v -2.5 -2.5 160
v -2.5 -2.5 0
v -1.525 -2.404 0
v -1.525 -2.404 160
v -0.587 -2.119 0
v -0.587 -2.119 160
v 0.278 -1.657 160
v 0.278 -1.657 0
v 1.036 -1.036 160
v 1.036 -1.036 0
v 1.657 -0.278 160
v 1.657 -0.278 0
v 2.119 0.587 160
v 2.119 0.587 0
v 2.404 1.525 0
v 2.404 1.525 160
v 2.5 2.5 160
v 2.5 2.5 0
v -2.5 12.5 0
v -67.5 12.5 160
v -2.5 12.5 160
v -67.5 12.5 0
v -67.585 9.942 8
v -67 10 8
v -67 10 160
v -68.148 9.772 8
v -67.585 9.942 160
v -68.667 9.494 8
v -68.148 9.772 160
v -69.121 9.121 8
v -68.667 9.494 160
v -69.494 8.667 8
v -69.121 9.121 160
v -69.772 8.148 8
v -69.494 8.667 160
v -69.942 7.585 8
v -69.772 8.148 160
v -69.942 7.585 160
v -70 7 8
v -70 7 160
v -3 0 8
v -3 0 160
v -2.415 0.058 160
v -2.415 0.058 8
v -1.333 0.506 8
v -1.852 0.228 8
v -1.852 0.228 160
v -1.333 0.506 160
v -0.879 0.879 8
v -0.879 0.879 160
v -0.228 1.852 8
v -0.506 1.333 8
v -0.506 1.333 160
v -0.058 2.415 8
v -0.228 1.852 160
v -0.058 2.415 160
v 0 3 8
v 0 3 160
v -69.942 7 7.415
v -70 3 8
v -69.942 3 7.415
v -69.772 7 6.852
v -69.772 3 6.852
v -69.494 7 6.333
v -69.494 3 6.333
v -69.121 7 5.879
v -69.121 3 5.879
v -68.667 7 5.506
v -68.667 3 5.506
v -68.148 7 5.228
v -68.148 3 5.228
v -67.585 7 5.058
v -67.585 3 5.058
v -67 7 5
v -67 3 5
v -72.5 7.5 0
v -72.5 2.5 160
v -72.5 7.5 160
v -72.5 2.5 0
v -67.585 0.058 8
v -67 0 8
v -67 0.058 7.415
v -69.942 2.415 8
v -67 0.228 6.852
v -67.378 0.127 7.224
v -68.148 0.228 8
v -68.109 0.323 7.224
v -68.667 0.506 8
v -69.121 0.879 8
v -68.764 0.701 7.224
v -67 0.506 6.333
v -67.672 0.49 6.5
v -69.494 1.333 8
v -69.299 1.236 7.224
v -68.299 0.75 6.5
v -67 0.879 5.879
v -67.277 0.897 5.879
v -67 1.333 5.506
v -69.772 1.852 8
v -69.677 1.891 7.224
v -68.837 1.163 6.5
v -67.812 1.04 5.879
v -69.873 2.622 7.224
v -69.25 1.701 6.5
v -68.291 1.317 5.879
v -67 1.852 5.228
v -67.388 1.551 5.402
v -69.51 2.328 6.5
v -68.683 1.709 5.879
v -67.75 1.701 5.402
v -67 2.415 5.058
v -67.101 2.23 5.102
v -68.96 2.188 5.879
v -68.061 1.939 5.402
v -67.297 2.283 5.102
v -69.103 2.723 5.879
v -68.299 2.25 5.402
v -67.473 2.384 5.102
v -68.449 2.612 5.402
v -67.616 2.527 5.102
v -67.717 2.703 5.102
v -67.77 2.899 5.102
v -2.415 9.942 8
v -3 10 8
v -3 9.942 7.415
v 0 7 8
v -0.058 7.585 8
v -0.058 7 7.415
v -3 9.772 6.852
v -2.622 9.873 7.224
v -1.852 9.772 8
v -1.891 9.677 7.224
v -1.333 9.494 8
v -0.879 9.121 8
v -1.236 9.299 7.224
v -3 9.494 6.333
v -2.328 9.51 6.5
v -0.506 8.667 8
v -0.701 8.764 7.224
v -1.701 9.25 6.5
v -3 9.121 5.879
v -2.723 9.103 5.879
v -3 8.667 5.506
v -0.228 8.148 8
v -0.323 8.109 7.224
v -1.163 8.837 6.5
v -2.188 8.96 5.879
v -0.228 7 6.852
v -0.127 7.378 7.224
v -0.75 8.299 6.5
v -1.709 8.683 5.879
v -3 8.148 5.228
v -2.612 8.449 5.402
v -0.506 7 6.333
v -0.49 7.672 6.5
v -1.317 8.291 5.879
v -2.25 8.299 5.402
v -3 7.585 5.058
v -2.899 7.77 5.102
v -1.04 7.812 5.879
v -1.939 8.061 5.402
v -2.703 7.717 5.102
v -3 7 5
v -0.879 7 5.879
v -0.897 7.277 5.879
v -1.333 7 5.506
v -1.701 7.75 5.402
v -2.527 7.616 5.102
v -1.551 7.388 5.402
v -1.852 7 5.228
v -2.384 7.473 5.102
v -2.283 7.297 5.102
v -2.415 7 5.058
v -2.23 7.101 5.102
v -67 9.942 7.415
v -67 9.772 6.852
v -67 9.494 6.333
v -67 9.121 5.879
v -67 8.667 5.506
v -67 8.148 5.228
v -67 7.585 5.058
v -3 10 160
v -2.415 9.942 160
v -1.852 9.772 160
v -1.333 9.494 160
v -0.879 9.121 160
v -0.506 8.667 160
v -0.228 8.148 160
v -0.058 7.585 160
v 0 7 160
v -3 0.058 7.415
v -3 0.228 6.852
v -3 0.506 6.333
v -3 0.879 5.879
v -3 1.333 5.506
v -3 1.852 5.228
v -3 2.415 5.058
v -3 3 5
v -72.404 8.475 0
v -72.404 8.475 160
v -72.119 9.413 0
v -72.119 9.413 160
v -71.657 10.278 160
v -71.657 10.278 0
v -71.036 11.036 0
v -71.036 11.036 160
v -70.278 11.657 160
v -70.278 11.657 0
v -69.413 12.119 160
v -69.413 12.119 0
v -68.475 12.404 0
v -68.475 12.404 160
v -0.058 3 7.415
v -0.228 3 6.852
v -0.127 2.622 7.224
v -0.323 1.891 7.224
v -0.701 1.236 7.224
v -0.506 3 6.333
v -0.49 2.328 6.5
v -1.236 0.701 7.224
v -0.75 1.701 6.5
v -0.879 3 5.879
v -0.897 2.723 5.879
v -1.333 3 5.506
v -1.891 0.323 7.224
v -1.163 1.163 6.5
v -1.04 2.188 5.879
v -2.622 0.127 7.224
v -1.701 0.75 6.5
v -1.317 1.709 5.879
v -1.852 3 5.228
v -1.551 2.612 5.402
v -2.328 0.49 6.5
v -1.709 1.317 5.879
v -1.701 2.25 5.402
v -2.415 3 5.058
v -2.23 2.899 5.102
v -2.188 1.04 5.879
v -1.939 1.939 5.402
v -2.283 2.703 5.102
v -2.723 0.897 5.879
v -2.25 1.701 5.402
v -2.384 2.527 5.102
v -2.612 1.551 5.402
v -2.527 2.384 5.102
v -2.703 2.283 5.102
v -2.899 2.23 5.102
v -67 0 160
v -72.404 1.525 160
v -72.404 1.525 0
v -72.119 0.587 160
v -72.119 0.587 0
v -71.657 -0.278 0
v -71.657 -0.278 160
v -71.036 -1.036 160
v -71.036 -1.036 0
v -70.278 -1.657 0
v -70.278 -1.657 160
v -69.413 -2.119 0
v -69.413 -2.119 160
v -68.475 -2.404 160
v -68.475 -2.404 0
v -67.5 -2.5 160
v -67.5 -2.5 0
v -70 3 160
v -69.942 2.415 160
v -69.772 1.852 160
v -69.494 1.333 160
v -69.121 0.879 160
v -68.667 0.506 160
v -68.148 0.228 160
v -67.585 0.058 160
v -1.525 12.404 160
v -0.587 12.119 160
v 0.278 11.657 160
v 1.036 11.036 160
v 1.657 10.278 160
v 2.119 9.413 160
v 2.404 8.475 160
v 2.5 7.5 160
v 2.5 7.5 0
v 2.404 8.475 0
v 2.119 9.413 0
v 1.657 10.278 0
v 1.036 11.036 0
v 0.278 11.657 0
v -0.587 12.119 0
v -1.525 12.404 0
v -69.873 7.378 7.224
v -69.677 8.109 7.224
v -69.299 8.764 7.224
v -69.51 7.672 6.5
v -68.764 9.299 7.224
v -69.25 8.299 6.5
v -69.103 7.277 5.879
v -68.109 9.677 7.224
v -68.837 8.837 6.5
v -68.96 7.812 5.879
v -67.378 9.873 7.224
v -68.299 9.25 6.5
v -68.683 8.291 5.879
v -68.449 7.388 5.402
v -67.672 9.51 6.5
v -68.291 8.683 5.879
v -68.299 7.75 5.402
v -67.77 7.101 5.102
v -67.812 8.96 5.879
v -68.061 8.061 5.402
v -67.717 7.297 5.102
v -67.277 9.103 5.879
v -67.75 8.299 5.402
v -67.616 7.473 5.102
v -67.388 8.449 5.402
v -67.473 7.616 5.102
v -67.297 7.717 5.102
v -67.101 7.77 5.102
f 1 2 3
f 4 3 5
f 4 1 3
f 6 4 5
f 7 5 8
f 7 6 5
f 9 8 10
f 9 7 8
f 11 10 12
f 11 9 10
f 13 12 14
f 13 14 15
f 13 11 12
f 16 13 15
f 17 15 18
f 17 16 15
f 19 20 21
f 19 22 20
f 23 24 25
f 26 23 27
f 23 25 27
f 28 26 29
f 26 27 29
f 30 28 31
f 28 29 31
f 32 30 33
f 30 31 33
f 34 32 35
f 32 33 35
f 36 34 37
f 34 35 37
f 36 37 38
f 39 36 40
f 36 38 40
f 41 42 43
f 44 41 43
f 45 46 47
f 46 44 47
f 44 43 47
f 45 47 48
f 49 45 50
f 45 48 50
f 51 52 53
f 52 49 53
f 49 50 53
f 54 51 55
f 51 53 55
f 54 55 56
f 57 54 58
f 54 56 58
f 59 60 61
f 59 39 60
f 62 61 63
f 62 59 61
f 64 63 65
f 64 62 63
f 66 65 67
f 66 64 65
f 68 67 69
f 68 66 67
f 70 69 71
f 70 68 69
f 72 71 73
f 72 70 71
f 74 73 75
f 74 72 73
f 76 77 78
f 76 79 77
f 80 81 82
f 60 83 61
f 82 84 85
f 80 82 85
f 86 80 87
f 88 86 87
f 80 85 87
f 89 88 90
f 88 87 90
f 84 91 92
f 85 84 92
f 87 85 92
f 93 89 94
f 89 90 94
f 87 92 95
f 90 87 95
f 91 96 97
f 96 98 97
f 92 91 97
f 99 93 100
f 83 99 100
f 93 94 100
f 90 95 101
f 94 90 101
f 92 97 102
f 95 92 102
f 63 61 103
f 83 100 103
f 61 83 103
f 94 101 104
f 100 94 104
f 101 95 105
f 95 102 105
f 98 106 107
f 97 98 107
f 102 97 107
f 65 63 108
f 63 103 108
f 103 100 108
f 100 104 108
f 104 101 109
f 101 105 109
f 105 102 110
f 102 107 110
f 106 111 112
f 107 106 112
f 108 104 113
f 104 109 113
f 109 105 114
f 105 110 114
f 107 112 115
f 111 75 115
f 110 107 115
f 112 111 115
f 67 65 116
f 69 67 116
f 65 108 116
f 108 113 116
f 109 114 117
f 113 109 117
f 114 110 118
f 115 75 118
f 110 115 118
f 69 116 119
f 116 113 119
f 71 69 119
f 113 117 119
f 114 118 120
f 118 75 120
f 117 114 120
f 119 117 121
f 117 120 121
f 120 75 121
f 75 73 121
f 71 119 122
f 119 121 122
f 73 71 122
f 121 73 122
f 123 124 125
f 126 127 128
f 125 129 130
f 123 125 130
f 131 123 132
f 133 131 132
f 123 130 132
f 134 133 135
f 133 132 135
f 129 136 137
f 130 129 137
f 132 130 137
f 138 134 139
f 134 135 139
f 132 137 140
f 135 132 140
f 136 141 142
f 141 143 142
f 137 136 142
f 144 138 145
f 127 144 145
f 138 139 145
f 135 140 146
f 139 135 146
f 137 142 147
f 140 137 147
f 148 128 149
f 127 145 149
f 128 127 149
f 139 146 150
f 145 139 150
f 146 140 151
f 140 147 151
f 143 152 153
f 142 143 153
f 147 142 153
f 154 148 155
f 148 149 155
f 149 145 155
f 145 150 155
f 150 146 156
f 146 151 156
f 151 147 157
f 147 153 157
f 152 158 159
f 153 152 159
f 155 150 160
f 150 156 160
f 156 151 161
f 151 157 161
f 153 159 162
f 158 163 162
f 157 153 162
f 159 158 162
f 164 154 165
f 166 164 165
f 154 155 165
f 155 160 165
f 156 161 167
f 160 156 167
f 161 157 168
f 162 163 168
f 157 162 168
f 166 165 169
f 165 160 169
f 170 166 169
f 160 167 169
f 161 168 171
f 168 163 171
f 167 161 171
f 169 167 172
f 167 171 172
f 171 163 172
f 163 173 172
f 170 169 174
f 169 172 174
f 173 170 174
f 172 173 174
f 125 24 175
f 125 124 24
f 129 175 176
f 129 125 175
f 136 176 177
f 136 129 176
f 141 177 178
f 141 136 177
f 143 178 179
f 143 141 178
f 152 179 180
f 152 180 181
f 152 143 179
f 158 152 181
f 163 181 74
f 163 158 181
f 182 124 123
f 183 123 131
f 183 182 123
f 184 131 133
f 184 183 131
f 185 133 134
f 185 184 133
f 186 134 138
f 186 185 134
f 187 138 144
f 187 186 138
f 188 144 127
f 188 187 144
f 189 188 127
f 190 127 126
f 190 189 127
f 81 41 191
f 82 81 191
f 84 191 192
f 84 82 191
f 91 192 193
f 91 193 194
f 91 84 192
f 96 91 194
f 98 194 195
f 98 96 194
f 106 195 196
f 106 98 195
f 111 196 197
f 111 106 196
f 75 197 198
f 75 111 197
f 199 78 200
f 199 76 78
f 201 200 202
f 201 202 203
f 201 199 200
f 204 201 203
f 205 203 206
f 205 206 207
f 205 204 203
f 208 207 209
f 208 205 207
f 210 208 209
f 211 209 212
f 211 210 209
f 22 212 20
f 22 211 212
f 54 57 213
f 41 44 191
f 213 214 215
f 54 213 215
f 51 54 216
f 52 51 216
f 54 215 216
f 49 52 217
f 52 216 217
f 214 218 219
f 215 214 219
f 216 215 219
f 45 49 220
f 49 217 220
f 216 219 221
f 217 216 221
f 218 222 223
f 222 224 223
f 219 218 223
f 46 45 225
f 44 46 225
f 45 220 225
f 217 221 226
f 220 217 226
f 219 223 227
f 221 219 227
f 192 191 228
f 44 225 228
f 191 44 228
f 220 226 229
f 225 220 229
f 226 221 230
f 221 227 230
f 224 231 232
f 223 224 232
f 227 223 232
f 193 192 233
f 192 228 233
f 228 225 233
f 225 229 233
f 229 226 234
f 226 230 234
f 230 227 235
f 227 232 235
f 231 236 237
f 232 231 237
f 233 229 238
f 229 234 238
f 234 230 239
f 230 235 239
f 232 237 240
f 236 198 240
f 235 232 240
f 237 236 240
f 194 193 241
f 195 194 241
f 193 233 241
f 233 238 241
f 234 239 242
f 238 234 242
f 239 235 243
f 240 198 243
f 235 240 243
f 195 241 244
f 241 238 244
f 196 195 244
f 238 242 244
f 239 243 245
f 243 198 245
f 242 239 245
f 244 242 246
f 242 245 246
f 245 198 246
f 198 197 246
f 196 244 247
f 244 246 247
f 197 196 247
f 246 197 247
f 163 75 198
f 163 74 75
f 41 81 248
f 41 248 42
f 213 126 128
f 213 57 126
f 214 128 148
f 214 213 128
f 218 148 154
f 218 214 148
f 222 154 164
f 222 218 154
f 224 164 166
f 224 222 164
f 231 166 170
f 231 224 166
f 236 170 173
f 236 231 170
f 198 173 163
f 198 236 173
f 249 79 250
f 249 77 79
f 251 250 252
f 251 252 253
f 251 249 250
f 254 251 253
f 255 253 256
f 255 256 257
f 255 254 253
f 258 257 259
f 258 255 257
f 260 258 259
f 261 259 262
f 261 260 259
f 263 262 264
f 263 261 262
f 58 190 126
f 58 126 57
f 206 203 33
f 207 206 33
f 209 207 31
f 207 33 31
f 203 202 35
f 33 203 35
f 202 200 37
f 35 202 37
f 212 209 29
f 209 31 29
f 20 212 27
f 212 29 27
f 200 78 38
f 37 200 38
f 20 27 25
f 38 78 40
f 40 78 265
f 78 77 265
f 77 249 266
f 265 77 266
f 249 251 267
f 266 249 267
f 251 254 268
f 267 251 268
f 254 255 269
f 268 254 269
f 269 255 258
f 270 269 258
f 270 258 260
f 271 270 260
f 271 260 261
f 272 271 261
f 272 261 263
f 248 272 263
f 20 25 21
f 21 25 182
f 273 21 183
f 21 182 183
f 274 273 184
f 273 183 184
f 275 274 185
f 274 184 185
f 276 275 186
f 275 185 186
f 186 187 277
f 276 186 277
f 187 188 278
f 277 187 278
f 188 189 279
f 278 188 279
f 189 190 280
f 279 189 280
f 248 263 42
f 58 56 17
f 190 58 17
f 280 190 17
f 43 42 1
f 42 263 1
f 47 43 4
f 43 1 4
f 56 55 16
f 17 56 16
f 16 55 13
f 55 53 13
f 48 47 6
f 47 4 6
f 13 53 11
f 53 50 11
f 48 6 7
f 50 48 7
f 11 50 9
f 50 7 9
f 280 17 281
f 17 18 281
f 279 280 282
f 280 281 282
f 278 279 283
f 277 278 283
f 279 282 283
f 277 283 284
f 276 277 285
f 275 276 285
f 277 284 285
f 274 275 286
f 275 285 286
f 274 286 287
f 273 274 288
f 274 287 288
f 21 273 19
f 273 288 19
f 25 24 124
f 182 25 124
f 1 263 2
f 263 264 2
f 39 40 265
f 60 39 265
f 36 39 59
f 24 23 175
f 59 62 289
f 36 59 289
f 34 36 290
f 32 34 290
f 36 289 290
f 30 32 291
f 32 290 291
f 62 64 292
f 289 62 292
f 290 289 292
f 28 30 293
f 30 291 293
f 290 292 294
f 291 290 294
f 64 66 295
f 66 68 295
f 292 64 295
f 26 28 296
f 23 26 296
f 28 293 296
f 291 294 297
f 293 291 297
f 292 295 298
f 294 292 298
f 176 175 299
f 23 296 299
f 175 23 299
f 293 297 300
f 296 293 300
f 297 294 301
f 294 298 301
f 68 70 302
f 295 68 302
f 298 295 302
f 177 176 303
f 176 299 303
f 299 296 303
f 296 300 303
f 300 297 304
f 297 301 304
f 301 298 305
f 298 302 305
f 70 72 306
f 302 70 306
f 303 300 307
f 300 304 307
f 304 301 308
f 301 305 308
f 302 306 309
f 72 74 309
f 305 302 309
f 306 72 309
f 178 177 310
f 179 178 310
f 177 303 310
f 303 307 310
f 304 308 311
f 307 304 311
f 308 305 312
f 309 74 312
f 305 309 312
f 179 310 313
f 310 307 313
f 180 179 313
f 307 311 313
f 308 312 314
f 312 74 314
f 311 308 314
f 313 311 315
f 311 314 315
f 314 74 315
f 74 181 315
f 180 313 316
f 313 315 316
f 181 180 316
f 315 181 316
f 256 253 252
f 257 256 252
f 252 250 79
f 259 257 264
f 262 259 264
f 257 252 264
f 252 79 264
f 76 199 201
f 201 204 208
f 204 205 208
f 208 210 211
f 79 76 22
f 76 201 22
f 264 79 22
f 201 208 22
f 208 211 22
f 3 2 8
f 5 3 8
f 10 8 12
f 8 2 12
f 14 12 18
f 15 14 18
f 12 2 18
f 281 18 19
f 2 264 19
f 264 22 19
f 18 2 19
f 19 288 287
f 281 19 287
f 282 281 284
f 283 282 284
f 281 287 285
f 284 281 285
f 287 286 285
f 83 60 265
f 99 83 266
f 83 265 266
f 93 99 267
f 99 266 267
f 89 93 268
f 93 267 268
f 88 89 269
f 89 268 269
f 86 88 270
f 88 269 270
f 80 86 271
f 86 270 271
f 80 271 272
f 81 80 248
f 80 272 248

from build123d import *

# Parameters (mm, degrees)
F0_W     = 75
F0_H     = 15
F1_DEPTH = 5
F2_W     = 75
F2_H     = 15
F2_W_2   = 70
F2_H_2   = 10
F3_DEPTH = 160
F4_R     = 5
F5_R     = 5
F6_R     = 5
F7_R     = 5
F8_R     = 3
F9_R     = 3
F10_R    = 3
F11_R    = 3
F12_R    = 3


# Not quite as in the source:
# - two fillets or chamfers of one size are made in one step


with BuildPart() as f1:
    # F0 (on Top) → F1 (new body)
    with BuildSketch(Plane.XY):
        with Locations((-35, 5)):
            Rectangle(F0_W, F0_H)
    extrude(amount=F1_DEPTH)

    # F2 (on face) → F3 (join)
    with BuildSketch(Plane(origin=(0, 0, 0), x_dir=(1, 0, 0), z_dir=(0, 0, -1))):
        with Locations((-35, -5)):
            Rectangle(F2_W, F2_H)
        with Locations((-35, -5)):
            Rectangle(F2_W_2, F2_H_2, mode=Mode.SUBTRACT)
    extrude(amount=-F3_DEPTH)

    # F4
    f4_edges = [f1.edges().sort_by_distance(p)[0] for p in [
        (-72.5, 12.5, 80),
    ]]
    fillet(f4_edges, radius=F4_R)

    # F5
    f5_edges = [f1.edges().sort_by_distance(p)[0] for p in [
        (-72.5, -2.5, 80),
    ]]
    fillet(f5_edges, radius=F5_R)

    # F6
    f6_edges = [f1.edges().sort_by_distance(p)[0] for p in [
        (2.5, -2.5, 80),
    ]]
    fillet(f6_edges, radius=F6_R)

    # F7
    f7_edges = [f1.edges().sort_by_distance(p)[0] for p in [
        (2.5, 12.5, 80),
    ]]
    fillet(f7_edges, radius=F7_R)

    # F8
    f8_edges = [f1.edges().sort_by_distance(p)[0] for p in [
        (-70, 10, 82.5),
    ]]
    fillet(f8_edges, radius=F8_R)

    # F9
    f9_edges = [f1.edges().sort_by_distance(p)[0] for p in [
        (0, 10, 82.5),
    ]]
    fillet(f9_edges, radius=F9_R)

    # F10
    f10_edges = [f1.edges().sort_by_distance(p)[0] for p in [
        (-70, 0, 82.5),
    ]]
    fillet(f10_edges, radius=F10_R)

    # F11
    f11_edges = [f1.edges().sort_by_distance(p)[0] for p in [
        (0, 0, 82.5),
    ]]
    fillet(f11_edges, radius=F11_R)

    # F12
    f12_edges = [f1.edges().sort_by_distance(p)[0] for p in [
        (-35, 0, 5),
        (-0.87868, 0.87868, 5),
        (-69.12132, 0.87868, 5),
        (0, 5, 5),
        (-70, 5, 5),
        (-0.87868, 9.12132, 5),
        (-69.12132, 9.12132, 5),
        (-35, 10, 5),
    ]]
    fillet(f12_edges, radius=F12_R)


solid = f1.part
